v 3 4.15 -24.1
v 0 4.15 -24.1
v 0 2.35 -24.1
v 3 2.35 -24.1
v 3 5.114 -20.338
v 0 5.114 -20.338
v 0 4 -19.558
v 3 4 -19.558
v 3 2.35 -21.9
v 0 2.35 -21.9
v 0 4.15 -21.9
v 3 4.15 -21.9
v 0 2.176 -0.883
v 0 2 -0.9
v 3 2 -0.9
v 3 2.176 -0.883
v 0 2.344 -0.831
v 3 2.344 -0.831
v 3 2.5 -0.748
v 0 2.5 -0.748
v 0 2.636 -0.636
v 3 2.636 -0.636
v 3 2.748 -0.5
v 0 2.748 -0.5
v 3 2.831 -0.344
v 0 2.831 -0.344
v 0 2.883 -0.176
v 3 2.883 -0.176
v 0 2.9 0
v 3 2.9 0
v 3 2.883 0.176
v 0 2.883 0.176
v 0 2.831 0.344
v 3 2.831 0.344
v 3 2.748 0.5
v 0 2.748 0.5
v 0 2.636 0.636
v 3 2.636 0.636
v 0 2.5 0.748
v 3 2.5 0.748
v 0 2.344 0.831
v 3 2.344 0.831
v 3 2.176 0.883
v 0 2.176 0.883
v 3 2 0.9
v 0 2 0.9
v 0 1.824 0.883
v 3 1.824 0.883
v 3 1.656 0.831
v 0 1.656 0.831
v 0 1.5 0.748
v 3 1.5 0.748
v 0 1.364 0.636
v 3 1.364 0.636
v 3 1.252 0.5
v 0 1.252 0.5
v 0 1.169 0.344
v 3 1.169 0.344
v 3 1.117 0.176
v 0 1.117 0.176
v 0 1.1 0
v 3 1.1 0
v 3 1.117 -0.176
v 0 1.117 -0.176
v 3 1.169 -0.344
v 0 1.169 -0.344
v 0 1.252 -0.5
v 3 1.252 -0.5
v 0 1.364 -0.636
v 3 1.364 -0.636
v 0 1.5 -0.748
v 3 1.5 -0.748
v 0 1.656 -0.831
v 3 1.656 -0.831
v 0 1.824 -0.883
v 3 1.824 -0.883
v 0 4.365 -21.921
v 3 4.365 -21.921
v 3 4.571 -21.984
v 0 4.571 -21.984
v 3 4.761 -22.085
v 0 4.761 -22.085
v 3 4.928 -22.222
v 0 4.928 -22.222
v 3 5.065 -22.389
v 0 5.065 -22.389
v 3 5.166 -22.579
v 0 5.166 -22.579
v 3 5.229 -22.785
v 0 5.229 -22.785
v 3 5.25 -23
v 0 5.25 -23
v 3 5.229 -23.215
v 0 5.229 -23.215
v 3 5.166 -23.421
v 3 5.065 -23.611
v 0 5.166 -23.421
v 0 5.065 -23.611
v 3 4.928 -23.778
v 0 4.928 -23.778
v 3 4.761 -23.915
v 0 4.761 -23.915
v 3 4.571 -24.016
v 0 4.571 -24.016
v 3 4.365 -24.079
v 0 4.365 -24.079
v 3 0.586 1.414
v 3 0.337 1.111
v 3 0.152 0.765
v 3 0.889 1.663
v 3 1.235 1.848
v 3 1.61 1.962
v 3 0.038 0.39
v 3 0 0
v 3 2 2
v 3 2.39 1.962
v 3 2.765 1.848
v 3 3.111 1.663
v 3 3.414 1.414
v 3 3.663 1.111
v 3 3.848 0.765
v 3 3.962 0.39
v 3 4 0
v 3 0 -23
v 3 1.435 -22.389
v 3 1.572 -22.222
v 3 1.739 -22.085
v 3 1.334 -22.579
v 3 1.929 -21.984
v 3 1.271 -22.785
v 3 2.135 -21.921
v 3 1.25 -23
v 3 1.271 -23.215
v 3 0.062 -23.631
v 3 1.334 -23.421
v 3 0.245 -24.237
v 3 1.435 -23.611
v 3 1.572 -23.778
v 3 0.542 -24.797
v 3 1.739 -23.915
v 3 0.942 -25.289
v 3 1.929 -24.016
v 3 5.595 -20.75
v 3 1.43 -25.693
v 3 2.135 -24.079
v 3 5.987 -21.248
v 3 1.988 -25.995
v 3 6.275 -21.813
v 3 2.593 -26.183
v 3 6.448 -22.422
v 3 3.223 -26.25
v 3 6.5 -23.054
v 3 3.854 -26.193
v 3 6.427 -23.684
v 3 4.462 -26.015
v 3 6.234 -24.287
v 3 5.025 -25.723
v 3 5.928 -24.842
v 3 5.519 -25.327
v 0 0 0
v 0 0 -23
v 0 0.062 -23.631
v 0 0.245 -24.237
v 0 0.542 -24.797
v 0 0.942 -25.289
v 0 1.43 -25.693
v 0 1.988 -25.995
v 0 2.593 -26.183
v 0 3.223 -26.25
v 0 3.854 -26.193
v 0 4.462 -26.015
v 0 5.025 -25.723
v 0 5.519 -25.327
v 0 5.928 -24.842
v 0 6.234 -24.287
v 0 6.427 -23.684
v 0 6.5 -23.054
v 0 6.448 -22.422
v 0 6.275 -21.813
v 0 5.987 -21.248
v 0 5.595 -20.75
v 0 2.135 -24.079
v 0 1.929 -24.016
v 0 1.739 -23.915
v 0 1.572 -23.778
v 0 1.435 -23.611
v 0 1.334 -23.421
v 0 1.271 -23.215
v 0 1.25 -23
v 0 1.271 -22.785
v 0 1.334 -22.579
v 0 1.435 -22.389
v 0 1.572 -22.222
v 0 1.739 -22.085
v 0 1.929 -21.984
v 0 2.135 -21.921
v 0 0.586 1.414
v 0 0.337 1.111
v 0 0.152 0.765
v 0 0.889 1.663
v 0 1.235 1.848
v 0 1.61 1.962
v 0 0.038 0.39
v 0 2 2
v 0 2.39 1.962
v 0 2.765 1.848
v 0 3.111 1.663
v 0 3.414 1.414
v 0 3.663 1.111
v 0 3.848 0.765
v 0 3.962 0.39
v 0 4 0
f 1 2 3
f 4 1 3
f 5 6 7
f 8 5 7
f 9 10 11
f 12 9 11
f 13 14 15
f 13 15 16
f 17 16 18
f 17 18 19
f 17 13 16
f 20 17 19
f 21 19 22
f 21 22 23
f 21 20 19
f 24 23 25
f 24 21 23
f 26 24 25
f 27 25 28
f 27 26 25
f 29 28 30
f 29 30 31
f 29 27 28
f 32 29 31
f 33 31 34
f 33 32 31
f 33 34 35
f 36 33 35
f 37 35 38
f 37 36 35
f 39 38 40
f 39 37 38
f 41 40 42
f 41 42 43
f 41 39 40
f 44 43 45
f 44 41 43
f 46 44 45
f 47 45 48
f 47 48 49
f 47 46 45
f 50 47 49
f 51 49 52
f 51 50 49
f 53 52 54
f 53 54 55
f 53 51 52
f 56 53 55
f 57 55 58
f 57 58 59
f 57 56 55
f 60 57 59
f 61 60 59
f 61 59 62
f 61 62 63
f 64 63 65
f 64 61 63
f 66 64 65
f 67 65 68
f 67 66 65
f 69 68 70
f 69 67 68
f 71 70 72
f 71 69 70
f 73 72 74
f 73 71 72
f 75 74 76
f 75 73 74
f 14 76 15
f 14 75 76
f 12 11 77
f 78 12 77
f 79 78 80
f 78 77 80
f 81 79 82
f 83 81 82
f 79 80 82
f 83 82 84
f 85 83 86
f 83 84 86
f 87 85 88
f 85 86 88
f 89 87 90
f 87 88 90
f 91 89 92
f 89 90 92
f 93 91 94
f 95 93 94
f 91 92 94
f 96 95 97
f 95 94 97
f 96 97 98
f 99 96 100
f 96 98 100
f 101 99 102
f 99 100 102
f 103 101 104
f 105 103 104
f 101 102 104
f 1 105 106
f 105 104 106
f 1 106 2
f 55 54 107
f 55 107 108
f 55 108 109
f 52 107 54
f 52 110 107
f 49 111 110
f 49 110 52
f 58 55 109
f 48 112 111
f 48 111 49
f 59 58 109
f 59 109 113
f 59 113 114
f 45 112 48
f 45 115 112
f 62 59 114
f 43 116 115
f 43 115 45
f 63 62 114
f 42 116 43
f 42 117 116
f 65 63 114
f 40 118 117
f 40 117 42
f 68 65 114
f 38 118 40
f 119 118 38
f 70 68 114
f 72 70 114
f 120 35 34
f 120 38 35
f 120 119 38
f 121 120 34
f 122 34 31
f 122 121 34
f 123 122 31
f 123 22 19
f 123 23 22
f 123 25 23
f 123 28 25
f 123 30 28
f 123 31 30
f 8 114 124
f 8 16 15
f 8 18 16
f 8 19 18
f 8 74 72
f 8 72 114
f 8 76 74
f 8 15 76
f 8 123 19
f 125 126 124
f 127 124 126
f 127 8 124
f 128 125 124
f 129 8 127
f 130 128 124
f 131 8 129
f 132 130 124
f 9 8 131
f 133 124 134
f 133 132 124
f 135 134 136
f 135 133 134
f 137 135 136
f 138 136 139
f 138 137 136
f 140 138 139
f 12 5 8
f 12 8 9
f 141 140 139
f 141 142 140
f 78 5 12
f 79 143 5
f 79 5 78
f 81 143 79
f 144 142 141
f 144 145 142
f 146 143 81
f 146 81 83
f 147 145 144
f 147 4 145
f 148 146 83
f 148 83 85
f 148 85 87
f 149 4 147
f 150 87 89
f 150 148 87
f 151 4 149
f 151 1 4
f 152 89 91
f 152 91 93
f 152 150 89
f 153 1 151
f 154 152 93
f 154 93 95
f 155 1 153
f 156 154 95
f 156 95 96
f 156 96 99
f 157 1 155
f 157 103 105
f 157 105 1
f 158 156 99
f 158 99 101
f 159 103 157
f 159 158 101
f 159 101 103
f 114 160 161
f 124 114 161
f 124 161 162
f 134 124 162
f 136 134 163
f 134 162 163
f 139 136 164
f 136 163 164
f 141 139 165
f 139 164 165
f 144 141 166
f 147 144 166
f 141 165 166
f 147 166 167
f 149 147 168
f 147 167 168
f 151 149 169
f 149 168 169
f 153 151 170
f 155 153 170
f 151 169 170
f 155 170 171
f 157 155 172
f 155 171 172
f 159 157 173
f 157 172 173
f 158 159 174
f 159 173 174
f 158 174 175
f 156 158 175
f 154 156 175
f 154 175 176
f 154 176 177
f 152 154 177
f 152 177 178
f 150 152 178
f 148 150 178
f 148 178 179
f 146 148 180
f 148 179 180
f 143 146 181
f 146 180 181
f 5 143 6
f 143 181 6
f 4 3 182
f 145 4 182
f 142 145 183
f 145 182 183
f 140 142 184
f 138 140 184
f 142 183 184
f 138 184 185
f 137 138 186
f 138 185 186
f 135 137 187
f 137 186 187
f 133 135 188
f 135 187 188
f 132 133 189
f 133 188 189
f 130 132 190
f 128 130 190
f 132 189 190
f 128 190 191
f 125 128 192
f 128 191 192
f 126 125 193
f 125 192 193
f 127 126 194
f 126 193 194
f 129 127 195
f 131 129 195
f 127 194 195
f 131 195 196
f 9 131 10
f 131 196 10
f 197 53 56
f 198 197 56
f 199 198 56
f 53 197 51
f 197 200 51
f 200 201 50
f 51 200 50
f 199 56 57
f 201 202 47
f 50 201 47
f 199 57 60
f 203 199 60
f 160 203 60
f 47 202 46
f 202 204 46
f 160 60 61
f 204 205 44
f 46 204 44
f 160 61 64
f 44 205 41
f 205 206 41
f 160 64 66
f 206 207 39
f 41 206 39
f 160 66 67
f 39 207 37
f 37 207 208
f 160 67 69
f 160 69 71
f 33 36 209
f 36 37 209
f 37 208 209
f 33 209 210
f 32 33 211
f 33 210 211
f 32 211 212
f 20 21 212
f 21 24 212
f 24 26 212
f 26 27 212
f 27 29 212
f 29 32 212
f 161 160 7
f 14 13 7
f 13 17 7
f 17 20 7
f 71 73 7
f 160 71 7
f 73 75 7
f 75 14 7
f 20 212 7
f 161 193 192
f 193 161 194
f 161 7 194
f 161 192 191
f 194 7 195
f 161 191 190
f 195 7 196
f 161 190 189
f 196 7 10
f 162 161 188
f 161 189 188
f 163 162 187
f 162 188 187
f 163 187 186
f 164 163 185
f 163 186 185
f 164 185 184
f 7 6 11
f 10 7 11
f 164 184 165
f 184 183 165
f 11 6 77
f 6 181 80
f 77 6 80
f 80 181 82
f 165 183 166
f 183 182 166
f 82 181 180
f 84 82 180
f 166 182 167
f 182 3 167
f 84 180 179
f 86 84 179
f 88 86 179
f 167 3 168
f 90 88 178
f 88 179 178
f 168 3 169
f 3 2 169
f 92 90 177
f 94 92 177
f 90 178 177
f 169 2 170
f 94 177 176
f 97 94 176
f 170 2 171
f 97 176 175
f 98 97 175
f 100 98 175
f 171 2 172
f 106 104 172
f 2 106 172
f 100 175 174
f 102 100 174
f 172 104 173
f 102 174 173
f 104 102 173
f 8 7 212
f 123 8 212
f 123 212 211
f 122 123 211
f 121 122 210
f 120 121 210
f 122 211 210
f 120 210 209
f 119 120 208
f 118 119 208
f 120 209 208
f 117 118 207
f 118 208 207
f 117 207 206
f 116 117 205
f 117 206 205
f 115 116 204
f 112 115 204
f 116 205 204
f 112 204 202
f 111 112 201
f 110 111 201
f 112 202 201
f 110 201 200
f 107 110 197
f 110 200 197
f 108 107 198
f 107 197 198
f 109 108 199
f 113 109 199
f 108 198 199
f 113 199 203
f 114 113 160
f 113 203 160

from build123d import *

# Parameters (mm, degrees)
SKETCH1_R      = 0.9
EXTRUDE1_DEPTH = 3


with BuildPart() as part:
    # Sketch1 → Extrude1 (new body)
    with BuildSketch(Plane(origin=(0, 0, 0), x_dir=(0, 0, -1), z_dir=(1, 0, 0))):
        with BuildLine():
            Line((0, 0), (23, 0))
            ThreePointArc((23, 0), (25.882785208, 4.750682993), (20.337755856, 5.114123418))
            Line((20.337755856, 5.114123418), (19.55763824, 4))
            Line((19.55763824, 4), (0, 4))
            ThreePointArc((0, 4), (-2, 2), (0, 0))
        make_face()
        with Locations((0, 2)):
            Circle(SKETCH1_R, mode=Mode.SUBTRACT)
        with BuildLine():
            Line((24.1, 4.15), (24.1, 2.35))
            ThreePointArc((24.1, 2.35), (23, 1.25), (21.9, 2.35))
            Line((21.9, 2.35), (21.9, 4.15))
            ThreePointArc((21.9, 4.15), (23, 5.25), (24.1, 4.15))
        make_face(mode=Mode.SUBTRACT)
    extrude(amount=EXTRUDE1_DEPTH)


solid = part.part
